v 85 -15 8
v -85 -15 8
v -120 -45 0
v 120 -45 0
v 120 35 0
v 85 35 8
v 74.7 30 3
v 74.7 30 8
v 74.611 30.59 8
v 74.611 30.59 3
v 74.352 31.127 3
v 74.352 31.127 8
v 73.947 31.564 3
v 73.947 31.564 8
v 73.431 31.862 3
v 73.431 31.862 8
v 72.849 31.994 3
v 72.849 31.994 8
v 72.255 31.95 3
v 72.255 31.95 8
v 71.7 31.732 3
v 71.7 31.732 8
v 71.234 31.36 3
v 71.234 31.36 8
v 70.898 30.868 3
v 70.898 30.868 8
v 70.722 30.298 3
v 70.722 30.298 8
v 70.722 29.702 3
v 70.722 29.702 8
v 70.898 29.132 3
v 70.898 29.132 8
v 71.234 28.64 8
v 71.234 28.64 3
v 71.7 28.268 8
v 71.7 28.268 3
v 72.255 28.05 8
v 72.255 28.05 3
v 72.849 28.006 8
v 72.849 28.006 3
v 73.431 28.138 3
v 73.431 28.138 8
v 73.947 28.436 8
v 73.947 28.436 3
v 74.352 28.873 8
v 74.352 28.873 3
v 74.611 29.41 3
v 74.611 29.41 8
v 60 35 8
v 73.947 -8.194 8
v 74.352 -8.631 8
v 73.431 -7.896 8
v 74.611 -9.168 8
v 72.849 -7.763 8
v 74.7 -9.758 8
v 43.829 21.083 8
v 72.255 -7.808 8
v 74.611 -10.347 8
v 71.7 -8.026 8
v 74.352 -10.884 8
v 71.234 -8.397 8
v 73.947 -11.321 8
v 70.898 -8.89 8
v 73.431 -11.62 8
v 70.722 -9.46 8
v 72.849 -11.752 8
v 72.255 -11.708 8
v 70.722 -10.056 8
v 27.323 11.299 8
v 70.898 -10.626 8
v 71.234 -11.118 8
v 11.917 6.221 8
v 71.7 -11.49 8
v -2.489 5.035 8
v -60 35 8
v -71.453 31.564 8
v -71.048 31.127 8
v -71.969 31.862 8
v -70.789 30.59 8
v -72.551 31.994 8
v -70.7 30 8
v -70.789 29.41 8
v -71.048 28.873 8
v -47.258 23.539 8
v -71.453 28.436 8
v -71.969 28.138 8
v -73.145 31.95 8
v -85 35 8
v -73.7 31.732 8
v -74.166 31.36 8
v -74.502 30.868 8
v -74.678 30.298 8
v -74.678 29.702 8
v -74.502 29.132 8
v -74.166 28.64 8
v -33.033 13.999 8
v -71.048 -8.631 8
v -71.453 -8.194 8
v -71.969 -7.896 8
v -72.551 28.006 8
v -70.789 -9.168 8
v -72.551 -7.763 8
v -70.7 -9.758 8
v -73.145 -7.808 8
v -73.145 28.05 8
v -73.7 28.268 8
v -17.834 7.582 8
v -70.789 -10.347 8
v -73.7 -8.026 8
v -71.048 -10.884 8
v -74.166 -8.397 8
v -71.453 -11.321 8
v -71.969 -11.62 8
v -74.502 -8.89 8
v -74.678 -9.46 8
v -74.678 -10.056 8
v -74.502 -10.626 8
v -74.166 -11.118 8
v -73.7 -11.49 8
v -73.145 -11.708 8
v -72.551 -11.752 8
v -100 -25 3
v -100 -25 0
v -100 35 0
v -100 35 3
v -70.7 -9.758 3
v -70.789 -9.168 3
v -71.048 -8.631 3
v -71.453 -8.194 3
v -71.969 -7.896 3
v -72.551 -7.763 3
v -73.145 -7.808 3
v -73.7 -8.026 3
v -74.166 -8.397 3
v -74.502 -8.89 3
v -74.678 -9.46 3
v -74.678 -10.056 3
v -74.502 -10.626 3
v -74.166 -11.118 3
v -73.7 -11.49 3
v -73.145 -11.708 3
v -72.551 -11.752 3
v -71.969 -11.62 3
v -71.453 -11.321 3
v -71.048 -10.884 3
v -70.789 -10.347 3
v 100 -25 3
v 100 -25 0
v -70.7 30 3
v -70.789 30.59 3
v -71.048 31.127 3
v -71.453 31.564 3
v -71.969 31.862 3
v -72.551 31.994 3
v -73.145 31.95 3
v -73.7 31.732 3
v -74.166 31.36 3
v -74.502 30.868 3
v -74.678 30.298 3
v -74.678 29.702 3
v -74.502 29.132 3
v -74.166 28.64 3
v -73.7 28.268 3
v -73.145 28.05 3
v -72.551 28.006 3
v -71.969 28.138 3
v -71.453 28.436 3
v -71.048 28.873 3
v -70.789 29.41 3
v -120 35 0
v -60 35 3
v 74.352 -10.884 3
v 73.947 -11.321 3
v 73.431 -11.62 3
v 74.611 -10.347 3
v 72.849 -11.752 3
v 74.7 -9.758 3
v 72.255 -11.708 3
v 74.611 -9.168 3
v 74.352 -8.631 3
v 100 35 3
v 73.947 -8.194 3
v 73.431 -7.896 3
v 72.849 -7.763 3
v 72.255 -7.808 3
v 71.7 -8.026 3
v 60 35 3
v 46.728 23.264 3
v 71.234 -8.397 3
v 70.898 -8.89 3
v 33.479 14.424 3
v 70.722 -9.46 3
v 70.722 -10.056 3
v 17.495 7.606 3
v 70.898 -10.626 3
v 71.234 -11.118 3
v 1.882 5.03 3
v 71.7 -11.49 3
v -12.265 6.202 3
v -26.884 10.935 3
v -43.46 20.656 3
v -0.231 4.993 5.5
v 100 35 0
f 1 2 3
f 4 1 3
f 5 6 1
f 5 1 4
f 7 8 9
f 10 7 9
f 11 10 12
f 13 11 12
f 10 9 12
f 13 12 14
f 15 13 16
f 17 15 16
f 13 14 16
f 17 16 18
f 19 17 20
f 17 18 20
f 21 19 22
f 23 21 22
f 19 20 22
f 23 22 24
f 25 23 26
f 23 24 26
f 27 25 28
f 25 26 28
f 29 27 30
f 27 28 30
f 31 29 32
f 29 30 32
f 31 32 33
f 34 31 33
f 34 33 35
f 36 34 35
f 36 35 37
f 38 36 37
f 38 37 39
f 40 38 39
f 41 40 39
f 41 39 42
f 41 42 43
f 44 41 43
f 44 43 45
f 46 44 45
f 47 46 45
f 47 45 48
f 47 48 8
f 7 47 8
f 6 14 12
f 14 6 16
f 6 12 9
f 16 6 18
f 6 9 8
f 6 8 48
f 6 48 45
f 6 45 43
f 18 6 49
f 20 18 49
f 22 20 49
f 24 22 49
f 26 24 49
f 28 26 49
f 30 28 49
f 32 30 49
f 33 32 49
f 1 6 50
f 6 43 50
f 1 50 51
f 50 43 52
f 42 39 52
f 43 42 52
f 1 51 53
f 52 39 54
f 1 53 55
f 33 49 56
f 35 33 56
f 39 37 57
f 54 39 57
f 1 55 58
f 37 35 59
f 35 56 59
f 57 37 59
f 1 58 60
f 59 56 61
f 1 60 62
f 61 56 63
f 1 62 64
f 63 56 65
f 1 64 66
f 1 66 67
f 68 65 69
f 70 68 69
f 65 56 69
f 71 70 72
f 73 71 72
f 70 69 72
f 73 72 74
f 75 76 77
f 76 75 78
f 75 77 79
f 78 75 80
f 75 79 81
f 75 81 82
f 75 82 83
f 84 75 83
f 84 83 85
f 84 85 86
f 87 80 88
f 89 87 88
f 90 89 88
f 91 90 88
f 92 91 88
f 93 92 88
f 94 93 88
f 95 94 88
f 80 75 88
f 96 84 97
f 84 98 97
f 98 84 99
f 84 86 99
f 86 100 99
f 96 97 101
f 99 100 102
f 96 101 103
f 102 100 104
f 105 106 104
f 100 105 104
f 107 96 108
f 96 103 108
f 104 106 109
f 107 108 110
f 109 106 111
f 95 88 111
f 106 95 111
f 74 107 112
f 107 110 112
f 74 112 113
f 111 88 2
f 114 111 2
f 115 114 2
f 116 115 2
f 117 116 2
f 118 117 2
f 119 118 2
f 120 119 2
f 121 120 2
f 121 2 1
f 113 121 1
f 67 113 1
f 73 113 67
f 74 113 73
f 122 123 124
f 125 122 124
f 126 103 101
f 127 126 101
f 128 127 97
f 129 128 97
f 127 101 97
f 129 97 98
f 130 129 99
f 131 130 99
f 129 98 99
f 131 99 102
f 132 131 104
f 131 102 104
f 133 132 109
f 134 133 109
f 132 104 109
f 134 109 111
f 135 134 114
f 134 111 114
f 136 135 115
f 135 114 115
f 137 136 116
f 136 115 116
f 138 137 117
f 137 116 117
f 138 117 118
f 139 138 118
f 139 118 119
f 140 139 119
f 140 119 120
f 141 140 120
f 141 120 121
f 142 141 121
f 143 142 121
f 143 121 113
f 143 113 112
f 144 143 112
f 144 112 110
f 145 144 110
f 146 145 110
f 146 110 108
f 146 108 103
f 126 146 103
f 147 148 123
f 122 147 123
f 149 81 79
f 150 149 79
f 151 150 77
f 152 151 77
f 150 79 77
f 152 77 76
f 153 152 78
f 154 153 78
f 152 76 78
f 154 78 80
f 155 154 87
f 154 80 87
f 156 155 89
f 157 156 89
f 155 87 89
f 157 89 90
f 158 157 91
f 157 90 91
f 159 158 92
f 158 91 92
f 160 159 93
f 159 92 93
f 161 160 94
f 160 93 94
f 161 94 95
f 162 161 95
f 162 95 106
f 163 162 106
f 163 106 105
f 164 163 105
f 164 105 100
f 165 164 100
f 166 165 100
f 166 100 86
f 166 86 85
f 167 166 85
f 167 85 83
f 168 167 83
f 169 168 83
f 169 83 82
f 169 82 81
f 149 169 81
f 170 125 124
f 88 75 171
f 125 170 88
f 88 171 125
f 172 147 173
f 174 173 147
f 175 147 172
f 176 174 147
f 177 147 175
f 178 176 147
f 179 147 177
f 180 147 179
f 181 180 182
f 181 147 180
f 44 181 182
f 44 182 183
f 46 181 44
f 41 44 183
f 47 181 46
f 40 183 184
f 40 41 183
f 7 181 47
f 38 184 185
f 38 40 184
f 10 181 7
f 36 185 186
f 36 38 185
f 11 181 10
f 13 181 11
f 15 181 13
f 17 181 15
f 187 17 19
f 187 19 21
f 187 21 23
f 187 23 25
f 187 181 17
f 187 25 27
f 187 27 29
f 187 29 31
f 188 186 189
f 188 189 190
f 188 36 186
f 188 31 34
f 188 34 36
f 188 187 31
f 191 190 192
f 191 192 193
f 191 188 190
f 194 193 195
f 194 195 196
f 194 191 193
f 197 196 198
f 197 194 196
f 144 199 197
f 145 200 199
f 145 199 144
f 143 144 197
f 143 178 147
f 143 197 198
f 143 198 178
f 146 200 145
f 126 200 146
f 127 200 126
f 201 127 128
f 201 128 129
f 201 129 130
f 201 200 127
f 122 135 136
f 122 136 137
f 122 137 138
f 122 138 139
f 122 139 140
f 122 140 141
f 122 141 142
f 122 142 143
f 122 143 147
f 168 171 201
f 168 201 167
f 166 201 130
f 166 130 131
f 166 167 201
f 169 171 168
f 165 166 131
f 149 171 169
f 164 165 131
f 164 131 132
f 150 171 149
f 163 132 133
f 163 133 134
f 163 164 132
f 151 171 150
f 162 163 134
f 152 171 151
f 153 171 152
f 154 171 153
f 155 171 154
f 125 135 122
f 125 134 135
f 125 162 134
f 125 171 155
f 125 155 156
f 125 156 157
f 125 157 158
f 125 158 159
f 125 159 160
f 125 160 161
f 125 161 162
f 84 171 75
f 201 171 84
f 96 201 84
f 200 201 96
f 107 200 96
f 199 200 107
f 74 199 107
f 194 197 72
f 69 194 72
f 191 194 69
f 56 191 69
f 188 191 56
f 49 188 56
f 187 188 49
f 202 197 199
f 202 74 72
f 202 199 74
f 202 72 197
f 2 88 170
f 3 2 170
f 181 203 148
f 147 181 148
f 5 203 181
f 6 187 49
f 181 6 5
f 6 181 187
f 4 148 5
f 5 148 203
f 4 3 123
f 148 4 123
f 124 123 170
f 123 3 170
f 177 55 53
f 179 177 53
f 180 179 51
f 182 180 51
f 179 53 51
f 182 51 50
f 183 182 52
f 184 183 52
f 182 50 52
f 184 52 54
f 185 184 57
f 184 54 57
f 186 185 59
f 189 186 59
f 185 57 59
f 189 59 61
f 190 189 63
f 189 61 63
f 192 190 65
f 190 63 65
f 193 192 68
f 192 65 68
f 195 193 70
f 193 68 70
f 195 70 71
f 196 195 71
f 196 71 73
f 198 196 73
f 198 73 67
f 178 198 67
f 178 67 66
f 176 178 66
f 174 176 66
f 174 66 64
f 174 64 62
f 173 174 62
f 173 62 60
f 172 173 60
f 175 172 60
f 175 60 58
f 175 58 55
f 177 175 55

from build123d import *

# Parameters (mm, degrees)
SKETCH_1_W           = 200
SKETCH_1_H           = 90
EXTRUDE_1_DEPTH      = 8
CUT_EXTRUDE_2_DEPTH  = 206.156038176
SKETCH_7_W           = 200
SKETCH_7_H           = 10
CUT_EXTRUDE_6_DEPTH  = 110.949988631
CUT_EXTRUDE_7_DEPTH  = 110.949988631
EXTRUDE_2_DEPTH      = 20
EXTRUDE_3_DEPTH      = 20
CUT_EXTRUDE_8_DEPTH  = 145.443760826
SKETCH_12_R          = 2
CUT_EXTRUDE_9_DEPTH  = 129.409501341
CUT_EXTRUDE_10_DEPTH = 3


with BuildPart() as part:
    # 草图1 → 凸台-拉伸1 (new body)
    with BuildSketch(Plane.XY):
        Rectangle(SKETCH_1_W, SKETCH_1_H)
    extrude(amount=EXTRUDE_1_DEPTH)

    # 草图3 → 切除-拉伸2 (cut, through all)
    with BuildSketch(Plane.ZY.offset(100)):
        Polygon((0, -45), (8, -15), (8, -45), align=None)
    extrude(amount=-CUT_EXTRUDE_2_DEPTH, mode=Mode.SUBTRACT)

    # 草图7 → 切除-拉伸6 (cut, through all)
    with BuildSketch(Plane(origin=(0, 0, 0), x_dir=(-1, 0, 0), z_dir=(0, 0, -1))):
        with Locations((0, 40)):
            Rectangle(SKETCH_7_W, SKETCH_7_H)
    extrude(amount=-CUT_EXTRUDE_6_DEPTH, mode=Mode.SUBTRACT)

    # 草图8 → 切除-拉伸7 (cut, through all)
    with BuildSketch(Plane(origin=(0, 0, 0), x_dir=(-1, 0, 0), z_dir=(0, 0, -1))):
        with BuildLine():
            Line((60, 35), (-60, 35))
            add(Edge.make_bspline(
                [(60, 35), (0.461478769, -25.014185767), (-60, 35)],
                knots=[0, 0, 0, 1, 1, 1], degree=2))
        make_face()
    extrude(amount=-CUT_EXTRUDE_7_DEPTH, mode=Mode.SUBTRACT)

    # 草图9 → 凸台-拉伸2 (add)
    with BuildSketch(Plane.ZY.offset(100)):
        Polygon((8, -15), (8, 35), (0, 35), (0, -45), align=None)
    extrude(amount=EXTRUDE_2_DEPTH)

    # 草图10 → 凸台-拉伸3 (add)
    with BuildSketch(Plane(origin=(100, 0, 0), x_dir=(0, 0, -1), z_dir=(1, 0, 0))):
        Polygon((0, -45), (0, 35), (-8, 35), (-8, -15), align=None)
    extrude(amount=EXTRUDE_3_DEPTH)

    # 草图11 → 切除-拉伸8 (cut, through all)
    with BuildSketch(Plane(origin=(0, 35, 0), x_dir=(1, 0, 0), z_dir=(0, 1, 0))):
        Polygon((120, 0), (120, -8), (85, -8), align=None)
        Polygon((-120, 0), (-120, -8), (-85, -8), align=None)
    extrude(amount=-CUT_EXTRUDE_8_DEPTH, mode=Mode.SUBTRACT)

    # 草图12 → 切除-拉伸9 (cut, through all)
    with BuildSketch(Plane.XY.offset(8)):
        with Locations((72.7, -9.757802573)):
            Circle(SKETCH_12_R)
        with Locations((-72.7, -9.757802573)):
            Circle(SKETCH_12_R)
        with Locations((72.7, 30)):
            Circle(SKETCH_12_R)
        with Locations((-72.7, 30)):
            Circle(SKETCH_12_R)
    extrude(amount=-CUT_EXTRUDE_9_DEPTH, mode=Mode.SUBTRACT)

    # 草图13 → 切除-拉伸10 (cut)
    with BuildSketch(Plane(origin=(0, 0, 0), x_dir=(-1, 0, 0), z_dir=(0, 0, -1))):
        with BuildLine():
            Line((-59.999999976, 34.999999976), (-100, 35))
            Line((-100, 35), (-100, -25))
            Line((-100, -25), (100, -25))
            Line((100, -25), (100, 35))
            Line((100, 35), (60, 35))
            add(Edge.make_bspline(
                [(60, 35), (0.461478781, -25.014185755), (-59.999999976, 34.999999976)],
                knots=[0, 0, 0, 1, 1, 1], degree=2))
        make_face()
    extrude(amount=-CUT_EXTRUDE_10_DEPTH, mode=Mode.SUBTRACT)


solid = part.part
